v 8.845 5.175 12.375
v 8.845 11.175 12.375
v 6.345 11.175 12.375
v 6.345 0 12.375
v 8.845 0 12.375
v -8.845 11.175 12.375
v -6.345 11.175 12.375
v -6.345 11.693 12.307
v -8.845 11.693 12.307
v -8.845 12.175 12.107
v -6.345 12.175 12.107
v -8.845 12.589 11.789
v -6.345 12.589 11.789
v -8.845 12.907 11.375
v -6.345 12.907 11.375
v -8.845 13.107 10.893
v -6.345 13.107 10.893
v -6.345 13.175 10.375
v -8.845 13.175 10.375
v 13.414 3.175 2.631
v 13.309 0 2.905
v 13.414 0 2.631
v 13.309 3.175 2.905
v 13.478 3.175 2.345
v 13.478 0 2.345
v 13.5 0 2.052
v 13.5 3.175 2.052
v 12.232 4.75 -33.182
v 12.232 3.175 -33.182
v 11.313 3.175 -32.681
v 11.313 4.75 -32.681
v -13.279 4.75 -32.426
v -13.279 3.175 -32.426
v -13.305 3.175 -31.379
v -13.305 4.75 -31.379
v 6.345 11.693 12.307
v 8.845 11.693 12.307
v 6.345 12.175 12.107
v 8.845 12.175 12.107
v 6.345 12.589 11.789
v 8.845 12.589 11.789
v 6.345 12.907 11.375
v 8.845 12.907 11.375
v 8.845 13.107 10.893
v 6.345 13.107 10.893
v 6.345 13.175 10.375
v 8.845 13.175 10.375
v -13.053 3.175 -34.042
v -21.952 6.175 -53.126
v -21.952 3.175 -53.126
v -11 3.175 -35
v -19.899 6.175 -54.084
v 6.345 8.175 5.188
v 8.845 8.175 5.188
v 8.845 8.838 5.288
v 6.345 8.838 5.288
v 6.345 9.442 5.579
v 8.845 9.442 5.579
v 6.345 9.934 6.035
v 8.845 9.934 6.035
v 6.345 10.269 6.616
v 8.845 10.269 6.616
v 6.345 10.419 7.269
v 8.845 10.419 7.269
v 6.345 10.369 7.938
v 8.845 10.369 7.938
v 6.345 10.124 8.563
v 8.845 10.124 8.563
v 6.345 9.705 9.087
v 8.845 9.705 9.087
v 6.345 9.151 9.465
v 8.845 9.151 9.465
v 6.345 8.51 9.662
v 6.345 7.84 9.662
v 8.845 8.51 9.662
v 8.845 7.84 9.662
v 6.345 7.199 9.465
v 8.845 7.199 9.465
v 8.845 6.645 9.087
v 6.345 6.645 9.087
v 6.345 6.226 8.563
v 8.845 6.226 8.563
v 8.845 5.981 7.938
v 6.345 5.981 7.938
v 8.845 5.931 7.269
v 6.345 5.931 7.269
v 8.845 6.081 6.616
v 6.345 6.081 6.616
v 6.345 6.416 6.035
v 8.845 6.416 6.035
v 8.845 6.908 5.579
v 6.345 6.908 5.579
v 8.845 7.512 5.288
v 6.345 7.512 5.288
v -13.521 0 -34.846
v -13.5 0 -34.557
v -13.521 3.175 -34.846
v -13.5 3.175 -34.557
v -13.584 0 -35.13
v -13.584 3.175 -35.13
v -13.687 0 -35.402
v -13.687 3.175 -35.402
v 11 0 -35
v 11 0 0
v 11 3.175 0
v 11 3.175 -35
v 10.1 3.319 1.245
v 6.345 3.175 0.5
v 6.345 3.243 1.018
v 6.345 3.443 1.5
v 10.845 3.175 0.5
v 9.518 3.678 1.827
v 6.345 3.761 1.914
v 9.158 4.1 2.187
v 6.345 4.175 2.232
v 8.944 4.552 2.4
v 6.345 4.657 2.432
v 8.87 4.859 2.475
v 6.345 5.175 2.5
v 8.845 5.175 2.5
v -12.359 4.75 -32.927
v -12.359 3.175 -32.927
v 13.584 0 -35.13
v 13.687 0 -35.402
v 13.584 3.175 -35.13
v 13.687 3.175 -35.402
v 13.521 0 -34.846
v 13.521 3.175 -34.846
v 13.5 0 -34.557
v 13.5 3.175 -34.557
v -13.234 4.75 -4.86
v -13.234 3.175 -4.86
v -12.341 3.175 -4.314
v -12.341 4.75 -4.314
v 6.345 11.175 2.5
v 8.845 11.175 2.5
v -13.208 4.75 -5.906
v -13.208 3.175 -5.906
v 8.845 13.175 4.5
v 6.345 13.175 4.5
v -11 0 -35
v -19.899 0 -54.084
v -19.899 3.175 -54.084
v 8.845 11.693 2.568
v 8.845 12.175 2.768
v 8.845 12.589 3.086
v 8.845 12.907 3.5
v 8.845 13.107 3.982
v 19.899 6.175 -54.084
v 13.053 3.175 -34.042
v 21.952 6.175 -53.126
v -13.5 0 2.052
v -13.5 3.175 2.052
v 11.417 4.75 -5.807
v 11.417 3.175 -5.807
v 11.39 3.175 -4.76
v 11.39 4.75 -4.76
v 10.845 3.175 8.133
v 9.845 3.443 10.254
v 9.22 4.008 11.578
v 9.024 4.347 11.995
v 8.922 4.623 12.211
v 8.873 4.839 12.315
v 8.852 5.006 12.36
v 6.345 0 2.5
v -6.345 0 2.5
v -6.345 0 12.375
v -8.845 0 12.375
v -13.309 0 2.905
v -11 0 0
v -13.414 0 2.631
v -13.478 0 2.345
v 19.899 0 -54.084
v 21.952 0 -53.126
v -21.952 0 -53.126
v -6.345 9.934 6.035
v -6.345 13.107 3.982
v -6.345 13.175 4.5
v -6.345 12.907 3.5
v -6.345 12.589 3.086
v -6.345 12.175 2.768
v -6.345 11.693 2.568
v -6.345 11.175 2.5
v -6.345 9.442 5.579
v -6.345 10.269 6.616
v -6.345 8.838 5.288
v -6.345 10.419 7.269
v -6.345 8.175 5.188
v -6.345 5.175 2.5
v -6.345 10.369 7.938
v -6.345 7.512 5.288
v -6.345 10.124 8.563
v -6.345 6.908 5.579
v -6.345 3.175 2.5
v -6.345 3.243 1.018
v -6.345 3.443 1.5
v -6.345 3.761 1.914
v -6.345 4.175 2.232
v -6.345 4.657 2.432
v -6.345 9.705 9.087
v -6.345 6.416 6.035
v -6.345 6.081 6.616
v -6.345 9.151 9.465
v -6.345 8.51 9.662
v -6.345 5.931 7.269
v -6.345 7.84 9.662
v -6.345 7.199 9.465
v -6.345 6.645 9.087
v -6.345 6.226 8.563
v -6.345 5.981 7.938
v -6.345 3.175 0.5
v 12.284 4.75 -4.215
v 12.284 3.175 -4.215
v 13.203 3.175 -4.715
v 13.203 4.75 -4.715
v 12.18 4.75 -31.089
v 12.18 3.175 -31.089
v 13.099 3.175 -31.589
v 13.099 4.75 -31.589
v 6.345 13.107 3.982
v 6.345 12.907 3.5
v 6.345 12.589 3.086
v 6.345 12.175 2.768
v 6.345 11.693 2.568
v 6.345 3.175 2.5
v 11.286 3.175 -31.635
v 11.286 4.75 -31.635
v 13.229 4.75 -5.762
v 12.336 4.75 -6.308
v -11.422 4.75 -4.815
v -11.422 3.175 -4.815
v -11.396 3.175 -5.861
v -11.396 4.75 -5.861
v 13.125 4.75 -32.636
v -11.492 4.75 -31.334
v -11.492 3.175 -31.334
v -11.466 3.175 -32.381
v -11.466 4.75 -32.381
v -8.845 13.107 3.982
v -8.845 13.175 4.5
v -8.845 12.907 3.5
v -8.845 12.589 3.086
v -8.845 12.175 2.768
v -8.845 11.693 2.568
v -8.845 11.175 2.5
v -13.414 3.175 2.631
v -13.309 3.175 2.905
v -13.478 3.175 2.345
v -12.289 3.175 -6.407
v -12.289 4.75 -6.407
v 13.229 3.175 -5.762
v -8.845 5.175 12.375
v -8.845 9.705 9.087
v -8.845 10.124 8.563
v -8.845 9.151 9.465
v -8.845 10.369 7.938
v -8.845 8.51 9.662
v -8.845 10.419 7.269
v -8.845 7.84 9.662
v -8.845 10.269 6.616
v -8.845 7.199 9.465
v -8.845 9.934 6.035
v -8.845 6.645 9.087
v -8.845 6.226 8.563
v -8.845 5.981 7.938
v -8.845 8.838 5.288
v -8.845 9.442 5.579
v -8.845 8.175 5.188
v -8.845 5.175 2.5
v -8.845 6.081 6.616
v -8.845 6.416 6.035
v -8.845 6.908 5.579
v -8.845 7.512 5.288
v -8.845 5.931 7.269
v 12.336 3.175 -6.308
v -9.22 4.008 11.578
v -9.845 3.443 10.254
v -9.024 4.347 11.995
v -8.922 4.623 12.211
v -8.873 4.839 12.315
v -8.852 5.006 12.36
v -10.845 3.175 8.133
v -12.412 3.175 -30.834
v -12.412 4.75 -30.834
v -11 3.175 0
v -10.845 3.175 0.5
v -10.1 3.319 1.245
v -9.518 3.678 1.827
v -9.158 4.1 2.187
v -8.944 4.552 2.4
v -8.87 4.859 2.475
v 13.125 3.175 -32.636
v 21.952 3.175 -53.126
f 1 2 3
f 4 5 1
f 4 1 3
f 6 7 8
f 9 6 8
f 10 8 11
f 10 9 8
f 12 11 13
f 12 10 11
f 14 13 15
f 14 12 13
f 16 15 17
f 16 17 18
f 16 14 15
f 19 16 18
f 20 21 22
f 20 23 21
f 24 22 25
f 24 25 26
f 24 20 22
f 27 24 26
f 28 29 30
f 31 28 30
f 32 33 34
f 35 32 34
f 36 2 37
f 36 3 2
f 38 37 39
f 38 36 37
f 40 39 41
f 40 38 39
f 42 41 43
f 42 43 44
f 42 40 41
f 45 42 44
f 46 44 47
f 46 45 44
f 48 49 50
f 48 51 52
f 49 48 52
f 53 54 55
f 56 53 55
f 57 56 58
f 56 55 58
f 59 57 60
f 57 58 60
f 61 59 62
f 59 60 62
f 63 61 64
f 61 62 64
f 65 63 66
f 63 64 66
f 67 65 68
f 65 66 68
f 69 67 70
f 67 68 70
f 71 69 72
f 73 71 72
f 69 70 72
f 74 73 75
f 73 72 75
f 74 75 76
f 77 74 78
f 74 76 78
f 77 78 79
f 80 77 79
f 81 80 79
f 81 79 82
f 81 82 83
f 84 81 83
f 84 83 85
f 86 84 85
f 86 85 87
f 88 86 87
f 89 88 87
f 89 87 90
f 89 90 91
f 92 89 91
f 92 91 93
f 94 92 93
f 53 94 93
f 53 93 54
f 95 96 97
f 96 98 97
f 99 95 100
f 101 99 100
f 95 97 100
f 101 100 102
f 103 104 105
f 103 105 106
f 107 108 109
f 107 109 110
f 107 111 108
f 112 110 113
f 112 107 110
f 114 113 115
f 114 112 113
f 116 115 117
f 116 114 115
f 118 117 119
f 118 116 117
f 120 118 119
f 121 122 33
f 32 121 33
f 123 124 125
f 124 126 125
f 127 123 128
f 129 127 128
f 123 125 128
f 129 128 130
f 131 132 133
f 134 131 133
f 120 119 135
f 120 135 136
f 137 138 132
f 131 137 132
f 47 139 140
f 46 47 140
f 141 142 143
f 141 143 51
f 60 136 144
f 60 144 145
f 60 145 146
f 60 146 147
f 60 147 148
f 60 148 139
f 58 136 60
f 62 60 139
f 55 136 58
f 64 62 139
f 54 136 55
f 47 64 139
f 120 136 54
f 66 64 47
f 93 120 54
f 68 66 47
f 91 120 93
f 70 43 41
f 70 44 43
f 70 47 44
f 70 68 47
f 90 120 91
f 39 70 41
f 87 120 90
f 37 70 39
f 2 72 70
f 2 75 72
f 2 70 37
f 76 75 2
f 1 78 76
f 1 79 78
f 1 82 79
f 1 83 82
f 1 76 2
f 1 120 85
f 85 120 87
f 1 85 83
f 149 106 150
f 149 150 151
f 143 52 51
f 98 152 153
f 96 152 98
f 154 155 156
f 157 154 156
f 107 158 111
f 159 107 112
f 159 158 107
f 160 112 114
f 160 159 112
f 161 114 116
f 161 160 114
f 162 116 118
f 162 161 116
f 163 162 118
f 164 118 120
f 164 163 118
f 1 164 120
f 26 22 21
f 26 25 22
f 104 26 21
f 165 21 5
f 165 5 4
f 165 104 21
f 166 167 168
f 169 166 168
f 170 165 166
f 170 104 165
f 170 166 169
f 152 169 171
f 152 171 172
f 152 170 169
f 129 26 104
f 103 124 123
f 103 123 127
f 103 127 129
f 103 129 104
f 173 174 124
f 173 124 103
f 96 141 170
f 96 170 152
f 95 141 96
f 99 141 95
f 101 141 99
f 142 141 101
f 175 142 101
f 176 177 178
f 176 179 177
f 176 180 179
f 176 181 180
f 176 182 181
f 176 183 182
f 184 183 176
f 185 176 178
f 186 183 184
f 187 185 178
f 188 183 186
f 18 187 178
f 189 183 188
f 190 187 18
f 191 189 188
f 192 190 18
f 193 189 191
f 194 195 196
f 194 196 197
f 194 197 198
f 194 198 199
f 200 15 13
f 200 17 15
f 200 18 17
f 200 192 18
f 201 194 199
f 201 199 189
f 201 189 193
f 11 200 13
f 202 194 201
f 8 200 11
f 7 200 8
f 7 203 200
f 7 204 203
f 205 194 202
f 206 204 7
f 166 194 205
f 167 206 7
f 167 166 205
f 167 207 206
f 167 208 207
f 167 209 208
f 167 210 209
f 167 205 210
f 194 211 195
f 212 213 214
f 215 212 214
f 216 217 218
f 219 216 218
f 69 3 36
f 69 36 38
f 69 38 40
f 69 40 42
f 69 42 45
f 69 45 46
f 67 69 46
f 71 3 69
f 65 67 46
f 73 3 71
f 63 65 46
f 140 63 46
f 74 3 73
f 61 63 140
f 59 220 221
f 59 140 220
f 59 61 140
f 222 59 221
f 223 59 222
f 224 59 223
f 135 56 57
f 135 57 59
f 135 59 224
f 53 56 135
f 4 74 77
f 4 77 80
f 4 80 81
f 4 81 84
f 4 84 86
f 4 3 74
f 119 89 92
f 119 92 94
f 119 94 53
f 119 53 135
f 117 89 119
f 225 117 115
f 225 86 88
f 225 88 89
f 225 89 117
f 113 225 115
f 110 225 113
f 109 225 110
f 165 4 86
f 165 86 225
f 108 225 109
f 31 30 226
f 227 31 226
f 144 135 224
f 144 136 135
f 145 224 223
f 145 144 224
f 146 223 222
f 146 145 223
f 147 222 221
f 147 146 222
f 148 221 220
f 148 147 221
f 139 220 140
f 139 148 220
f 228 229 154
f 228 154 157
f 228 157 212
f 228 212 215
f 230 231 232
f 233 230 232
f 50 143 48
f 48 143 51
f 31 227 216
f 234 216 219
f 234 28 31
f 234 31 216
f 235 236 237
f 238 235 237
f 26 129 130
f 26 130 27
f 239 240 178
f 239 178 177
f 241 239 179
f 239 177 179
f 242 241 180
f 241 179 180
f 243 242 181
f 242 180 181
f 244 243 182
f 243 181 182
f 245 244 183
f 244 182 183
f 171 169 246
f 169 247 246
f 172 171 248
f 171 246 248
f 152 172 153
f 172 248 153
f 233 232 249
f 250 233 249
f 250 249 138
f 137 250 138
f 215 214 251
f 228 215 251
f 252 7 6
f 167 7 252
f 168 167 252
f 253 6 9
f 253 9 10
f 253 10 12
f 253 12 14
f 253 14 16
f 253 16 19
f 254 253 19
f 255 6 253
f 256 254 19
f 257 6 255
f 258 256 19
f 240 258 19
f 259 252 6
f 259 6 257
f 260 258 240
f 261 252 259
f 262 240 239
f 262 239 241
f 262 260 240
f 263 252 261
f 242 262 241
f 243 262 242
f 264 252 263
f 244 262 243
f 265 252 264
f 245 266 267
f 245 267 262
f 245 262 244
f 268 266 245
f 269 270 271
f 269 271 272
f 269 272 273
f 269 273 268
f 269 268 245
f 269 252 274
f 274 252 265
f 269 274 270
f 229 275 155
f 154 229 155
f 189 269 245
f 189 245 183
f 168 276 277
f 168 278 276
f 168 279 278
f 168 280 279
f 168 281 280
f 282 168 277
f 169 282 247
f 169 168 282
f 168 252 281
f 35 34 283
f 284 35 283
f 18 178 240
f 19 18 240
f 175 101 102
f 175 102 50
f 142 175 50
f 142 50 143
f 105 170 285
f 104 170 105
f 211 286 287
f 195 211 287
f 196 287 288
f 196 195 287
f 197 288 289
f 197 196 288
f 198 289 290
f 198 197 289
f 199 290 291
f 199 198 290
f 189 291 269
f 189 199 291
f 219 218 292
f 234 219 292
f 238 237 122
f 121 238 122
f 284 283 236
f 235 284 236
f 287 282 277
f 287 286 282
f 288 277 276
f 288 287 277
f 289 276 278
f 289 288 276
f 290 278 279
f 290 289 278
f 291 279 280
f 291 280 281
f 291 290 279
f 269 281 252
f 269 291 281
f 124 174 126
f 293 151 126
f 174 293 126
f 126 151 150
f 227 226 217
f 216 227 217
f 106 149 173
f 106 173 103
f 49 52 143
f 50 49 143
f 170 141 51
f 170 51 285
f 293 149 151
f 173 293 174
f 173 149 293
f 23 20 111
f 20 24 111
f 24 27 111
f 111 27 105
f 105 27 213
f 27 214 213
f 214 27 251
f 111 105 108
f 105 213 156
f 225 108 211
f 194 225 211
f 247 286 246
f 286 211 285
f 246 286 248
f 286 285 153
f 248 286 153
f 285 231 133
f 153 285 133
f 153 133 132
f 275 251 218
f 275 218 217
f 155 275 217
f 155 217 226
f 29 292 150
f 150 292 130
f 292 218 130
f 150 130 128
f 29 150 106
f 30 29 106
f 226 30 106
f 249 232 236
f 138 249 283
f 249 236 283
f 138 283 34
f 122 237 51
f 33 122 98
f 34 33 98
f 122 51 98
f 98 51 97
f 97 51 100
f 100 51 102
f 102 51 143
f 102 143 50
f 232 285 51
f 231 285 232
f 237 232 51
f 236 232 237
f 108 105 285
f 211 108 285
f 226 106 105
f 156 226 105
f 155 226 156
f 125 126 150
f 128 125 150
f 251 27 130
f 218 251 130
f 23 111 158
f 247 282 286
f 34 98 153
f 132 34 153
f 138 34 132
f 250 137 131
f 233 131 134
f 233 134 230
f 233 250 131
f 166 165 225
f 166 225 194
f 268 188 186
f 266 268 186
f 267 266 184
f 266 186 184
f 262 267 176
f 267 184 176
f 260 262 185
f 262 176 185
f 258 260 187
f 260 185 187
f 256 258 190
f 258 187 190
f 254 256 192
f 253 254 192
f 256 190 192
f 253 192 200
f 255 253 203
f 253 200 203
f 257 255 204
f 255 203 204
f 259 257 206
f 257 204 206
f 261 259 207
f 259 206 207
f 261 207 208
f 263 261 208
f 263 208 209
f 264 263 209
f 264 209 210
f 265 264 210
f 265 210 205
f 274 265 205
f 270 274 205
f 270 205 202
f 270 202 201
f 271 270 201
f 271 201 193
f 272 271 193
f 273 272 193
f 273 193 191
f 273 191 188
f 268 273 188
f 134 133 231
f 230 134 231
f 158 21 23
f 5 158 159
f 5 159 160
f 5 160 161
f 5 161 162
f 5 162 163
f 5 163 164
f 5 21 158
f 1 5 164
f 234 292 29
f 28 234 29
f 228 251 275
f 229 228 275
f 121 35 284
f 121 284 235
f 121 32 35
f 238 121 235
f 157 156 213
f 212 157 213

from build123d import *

# Parameters (mm, degrees)
BOSS_EXTRUDE1_DEPTH = 3.175
BOSS_EXTRUDE2_DEPTH = 2.265769468
BOSS_EXTRUDE3_DEPTH = 10
FILLET1_R           = 2
BOSS_EXTRUDE4_DEPTH = 4.75
SKETCH4_R           = 2.2500000000000018
CUT_EXTRUDE1_DEPTH  = 18.5


with BuildPart() as part:
    # Sketch1 → Boss-Extrude1 (new body)
    with BuildSketch(Plane(origin=(0, 0, 0), x_dir=(1, 0, 0), z_dir=(0, 1, 0))):
        Polygon((11, 0), (11.000000000000009, 35), (19.89888072270586, 54.08371129463171), (21.952365234814028, 53.12615574073299), (13.500000000000009, 35), (13.500000000000005, -2.5), (8.844528392438283, -12.375154125673141), (6.344528392438283, -12.375154125673143), (6.344528392438281, -2.5), (-6.344528392438281, -2.5), (-6.344528392438283, -12.375154125673143), (-8.844528392438283, -12.375154125673141), (-13.500000000000005, -2.5), (-13.500000000000009, 35), (-21.952365234814028, 53.12615574073299), (-19.89888072270586, 54.08371129463171), (-11.000000000000009, 35), (-11, 0), align=None)
        Polygon((13.099081592546982, 31.589427960182903), (13.12519792775817, 32.635931348947494), (12.231957575547105, 33.18180045307645), (11.312600888124857, 32.68116616844078), (11.286484552913668, 31.634662779676173), (12.179724905124731, 31.08879367554723), align=None, mode=Mode.SUBTRACT)
        Polygon((-11.492356645788318, 31.334168150139266), (-11.466240310577122, 32.38067153890387), (-12.359480662788181, 32.926540643032816), (-13.278837350210425, 32.425906358397164), (-13.30495368542162, 31.379402969632554), (-12.411713333210562, 30.833533865503608), align=None, mode=Mode.SUBTRACT)
        Polygon((-11.421653218284588, 4.814576152050829), (-11.395536883073392, 5.861079540815429), (-12.288777235284451, 6.406948644944381), (-13.208133922706695, 5.906314360308727), (-13.23425025791789, 4.859810971544119), (-12.341009905706835, 4.313941867415173), align=None, mode=Mode.SUBTRACT)
        Polygon((13.203019518788883, 4.715182951572258), (13.229135854000079, 5.761686340336858), (12.335895501789022, 6.307555444465811), (11.416538814366778, 5.806921159830155), (11.390422479155582, 4.760417771065549), (12.283662831366636, 4.214548666936603), align=None, mode=Mode.SUBTRACT)
    extrude(amount=BOSS_EXTRUDE1_DEPTH)


with BuildPart() as body_2:
    # Sketch2 → Boss-Extrude2 (new body)
    with BuildSketch(Plane(origin=(4.370445901306202, 0, -2.0379723933312173), x_dir=(-0.42261826174070105, 0, -0.9063077870366492), z_dir=(0.9063077870366493, 0, -0.4226182617407011))):
        Polygon((36.369573425430445, 3.175), (57.426119079782204, 6.175), (57.426119079782204, 3.175), align=None)
    boss_extrude2 = extrude(amount=-BOSS_EXTRUDE2_DEPTH)


with BuildPart() as part_1:
    add(part.part)

    # Mirror4: Boss-Extrude2 across plane
    add(boss_extrude2.mirror(Plane(origin=(0, 0, 0), x_dir=(0, 0, 1), z_dir=(1, 0, 0))))

    # Sketch3 → Boss-Extrude3 (add)
    with BuildSketch(Plane(origin=(0, 3.175, 0), x_dir=(1, 0, 0), z_dir=(0, 1, 0))):
        Polygon((8.844528392438283, -12.375154125673141), (6.344528392438281, -12.375154125673143), (6.344528392438281, -2.5), (8.844528392438283, -2.4999999999999996), align=None)
        Polygon((-8.844528392438283, -2.4999999999999996), (-6.344528392438281, -2.5), (-6.344528392438281, -12.375154125673143), (-8.844528392438283, -12.375154125673141), align=None)
    extrude(amount=BOSS_EXTRUDE3_DEPTH)

    # Fillet1
    fillet1_edges = [part_1.edges().sort_by_distance(p)[0] for p in [
        (8.844528392438283, 3.175, 7.437577062836571),
        (7.594528392438282, 3.175, 2.5),
        (7.594528392438282, 13.175, 2.5),
        (7.594528392438282, 13.175, 12.375154125673141),
        (-8.844528392438283, 3.175, 7.437577062836571),
        (-7.594528392438282, 3.175, 2.4999999999999996),
        (-7.594528392438282, 13.175, 12.375154125673143),
        (-7.594528392438282, 13.175, 2.4999999999999996),
        (13.500000000000009, 1.5875, -35),
        (13.500000000000005, 1.5875, 2.5),
        (-13.500000000000005, 1.5875, 2.5),
        (-13.500000000000009, 1.5875, -35),
    ]]
    fillet(fillet1_edges, radius=FILLET1_R)

    # Sketch1<4> → Boss-Extrude4 (add)
    with BuildSketch(Plane(origin=(0, 0, 0), x_dir=(1, 0, 0), z_dir=(0, 1, 0))):
        Polygon((-13.30495368542162, 31.379402969632554), (-12.411713333210562, 30.833533865503608), (-11.492356645788318, 31.334168150139266), (-11.466240310577122, 32.38067153890387), (-12.359480662788181, 32.926540643032816), (-13.278837350210425, 32.425906358397164), align=None)
        Polygon((11.286484552913668, 31.634662779676173), (12.179724905124731, 31.08879367554723), (13.099081592546982, 31.589427960182903), (13.12519792775817, 32.635931348947494), (12.231957575547105, 33.18180045307645), (11.312600888124857, 32.68116616844078), align=None)
        Polygon((-11.421653218284588, 4.814576152050829), (-11.395536883073392, 5.861079540815429), (-12.288777235284451, 6.406948644944381), (-13.208133922706695, 5.906314360308727), (-13.23425025791789, 4.859810971544119), (-12.341009905706835, 4.313941867415173), align=None)
        Polygon((13.203019518788883, 4.715182951572258), (13.229135854000079, 5.761686340336858), (12.335895501789022, 6.307555444465811), (11.416538814366778, 5.806921159830155), (11.390422479155582, 4.760417771065549), (12.283662831366636, 4.214548666936603), align=None)
    extrude(amount=BOSS_EXTRUDE4_DEPTH)

    # Sketch4 → Cut-Extrude1 (cut)
    with BuildSketch(Plane(origin=(8.844528392438283, 0, 0), x_dir=(0, 0, -1), z_dir=(1, 0, 0))):
        with Locations((-7.437577062836571, 8.175)):
            Circle(SKETCH4_R)
    extrude(amount=-CUT_EXTRUDE1_DEPTH, mode=Mode.SUBTRACT)


solid = Compound([body_2.part, part_1.part])
